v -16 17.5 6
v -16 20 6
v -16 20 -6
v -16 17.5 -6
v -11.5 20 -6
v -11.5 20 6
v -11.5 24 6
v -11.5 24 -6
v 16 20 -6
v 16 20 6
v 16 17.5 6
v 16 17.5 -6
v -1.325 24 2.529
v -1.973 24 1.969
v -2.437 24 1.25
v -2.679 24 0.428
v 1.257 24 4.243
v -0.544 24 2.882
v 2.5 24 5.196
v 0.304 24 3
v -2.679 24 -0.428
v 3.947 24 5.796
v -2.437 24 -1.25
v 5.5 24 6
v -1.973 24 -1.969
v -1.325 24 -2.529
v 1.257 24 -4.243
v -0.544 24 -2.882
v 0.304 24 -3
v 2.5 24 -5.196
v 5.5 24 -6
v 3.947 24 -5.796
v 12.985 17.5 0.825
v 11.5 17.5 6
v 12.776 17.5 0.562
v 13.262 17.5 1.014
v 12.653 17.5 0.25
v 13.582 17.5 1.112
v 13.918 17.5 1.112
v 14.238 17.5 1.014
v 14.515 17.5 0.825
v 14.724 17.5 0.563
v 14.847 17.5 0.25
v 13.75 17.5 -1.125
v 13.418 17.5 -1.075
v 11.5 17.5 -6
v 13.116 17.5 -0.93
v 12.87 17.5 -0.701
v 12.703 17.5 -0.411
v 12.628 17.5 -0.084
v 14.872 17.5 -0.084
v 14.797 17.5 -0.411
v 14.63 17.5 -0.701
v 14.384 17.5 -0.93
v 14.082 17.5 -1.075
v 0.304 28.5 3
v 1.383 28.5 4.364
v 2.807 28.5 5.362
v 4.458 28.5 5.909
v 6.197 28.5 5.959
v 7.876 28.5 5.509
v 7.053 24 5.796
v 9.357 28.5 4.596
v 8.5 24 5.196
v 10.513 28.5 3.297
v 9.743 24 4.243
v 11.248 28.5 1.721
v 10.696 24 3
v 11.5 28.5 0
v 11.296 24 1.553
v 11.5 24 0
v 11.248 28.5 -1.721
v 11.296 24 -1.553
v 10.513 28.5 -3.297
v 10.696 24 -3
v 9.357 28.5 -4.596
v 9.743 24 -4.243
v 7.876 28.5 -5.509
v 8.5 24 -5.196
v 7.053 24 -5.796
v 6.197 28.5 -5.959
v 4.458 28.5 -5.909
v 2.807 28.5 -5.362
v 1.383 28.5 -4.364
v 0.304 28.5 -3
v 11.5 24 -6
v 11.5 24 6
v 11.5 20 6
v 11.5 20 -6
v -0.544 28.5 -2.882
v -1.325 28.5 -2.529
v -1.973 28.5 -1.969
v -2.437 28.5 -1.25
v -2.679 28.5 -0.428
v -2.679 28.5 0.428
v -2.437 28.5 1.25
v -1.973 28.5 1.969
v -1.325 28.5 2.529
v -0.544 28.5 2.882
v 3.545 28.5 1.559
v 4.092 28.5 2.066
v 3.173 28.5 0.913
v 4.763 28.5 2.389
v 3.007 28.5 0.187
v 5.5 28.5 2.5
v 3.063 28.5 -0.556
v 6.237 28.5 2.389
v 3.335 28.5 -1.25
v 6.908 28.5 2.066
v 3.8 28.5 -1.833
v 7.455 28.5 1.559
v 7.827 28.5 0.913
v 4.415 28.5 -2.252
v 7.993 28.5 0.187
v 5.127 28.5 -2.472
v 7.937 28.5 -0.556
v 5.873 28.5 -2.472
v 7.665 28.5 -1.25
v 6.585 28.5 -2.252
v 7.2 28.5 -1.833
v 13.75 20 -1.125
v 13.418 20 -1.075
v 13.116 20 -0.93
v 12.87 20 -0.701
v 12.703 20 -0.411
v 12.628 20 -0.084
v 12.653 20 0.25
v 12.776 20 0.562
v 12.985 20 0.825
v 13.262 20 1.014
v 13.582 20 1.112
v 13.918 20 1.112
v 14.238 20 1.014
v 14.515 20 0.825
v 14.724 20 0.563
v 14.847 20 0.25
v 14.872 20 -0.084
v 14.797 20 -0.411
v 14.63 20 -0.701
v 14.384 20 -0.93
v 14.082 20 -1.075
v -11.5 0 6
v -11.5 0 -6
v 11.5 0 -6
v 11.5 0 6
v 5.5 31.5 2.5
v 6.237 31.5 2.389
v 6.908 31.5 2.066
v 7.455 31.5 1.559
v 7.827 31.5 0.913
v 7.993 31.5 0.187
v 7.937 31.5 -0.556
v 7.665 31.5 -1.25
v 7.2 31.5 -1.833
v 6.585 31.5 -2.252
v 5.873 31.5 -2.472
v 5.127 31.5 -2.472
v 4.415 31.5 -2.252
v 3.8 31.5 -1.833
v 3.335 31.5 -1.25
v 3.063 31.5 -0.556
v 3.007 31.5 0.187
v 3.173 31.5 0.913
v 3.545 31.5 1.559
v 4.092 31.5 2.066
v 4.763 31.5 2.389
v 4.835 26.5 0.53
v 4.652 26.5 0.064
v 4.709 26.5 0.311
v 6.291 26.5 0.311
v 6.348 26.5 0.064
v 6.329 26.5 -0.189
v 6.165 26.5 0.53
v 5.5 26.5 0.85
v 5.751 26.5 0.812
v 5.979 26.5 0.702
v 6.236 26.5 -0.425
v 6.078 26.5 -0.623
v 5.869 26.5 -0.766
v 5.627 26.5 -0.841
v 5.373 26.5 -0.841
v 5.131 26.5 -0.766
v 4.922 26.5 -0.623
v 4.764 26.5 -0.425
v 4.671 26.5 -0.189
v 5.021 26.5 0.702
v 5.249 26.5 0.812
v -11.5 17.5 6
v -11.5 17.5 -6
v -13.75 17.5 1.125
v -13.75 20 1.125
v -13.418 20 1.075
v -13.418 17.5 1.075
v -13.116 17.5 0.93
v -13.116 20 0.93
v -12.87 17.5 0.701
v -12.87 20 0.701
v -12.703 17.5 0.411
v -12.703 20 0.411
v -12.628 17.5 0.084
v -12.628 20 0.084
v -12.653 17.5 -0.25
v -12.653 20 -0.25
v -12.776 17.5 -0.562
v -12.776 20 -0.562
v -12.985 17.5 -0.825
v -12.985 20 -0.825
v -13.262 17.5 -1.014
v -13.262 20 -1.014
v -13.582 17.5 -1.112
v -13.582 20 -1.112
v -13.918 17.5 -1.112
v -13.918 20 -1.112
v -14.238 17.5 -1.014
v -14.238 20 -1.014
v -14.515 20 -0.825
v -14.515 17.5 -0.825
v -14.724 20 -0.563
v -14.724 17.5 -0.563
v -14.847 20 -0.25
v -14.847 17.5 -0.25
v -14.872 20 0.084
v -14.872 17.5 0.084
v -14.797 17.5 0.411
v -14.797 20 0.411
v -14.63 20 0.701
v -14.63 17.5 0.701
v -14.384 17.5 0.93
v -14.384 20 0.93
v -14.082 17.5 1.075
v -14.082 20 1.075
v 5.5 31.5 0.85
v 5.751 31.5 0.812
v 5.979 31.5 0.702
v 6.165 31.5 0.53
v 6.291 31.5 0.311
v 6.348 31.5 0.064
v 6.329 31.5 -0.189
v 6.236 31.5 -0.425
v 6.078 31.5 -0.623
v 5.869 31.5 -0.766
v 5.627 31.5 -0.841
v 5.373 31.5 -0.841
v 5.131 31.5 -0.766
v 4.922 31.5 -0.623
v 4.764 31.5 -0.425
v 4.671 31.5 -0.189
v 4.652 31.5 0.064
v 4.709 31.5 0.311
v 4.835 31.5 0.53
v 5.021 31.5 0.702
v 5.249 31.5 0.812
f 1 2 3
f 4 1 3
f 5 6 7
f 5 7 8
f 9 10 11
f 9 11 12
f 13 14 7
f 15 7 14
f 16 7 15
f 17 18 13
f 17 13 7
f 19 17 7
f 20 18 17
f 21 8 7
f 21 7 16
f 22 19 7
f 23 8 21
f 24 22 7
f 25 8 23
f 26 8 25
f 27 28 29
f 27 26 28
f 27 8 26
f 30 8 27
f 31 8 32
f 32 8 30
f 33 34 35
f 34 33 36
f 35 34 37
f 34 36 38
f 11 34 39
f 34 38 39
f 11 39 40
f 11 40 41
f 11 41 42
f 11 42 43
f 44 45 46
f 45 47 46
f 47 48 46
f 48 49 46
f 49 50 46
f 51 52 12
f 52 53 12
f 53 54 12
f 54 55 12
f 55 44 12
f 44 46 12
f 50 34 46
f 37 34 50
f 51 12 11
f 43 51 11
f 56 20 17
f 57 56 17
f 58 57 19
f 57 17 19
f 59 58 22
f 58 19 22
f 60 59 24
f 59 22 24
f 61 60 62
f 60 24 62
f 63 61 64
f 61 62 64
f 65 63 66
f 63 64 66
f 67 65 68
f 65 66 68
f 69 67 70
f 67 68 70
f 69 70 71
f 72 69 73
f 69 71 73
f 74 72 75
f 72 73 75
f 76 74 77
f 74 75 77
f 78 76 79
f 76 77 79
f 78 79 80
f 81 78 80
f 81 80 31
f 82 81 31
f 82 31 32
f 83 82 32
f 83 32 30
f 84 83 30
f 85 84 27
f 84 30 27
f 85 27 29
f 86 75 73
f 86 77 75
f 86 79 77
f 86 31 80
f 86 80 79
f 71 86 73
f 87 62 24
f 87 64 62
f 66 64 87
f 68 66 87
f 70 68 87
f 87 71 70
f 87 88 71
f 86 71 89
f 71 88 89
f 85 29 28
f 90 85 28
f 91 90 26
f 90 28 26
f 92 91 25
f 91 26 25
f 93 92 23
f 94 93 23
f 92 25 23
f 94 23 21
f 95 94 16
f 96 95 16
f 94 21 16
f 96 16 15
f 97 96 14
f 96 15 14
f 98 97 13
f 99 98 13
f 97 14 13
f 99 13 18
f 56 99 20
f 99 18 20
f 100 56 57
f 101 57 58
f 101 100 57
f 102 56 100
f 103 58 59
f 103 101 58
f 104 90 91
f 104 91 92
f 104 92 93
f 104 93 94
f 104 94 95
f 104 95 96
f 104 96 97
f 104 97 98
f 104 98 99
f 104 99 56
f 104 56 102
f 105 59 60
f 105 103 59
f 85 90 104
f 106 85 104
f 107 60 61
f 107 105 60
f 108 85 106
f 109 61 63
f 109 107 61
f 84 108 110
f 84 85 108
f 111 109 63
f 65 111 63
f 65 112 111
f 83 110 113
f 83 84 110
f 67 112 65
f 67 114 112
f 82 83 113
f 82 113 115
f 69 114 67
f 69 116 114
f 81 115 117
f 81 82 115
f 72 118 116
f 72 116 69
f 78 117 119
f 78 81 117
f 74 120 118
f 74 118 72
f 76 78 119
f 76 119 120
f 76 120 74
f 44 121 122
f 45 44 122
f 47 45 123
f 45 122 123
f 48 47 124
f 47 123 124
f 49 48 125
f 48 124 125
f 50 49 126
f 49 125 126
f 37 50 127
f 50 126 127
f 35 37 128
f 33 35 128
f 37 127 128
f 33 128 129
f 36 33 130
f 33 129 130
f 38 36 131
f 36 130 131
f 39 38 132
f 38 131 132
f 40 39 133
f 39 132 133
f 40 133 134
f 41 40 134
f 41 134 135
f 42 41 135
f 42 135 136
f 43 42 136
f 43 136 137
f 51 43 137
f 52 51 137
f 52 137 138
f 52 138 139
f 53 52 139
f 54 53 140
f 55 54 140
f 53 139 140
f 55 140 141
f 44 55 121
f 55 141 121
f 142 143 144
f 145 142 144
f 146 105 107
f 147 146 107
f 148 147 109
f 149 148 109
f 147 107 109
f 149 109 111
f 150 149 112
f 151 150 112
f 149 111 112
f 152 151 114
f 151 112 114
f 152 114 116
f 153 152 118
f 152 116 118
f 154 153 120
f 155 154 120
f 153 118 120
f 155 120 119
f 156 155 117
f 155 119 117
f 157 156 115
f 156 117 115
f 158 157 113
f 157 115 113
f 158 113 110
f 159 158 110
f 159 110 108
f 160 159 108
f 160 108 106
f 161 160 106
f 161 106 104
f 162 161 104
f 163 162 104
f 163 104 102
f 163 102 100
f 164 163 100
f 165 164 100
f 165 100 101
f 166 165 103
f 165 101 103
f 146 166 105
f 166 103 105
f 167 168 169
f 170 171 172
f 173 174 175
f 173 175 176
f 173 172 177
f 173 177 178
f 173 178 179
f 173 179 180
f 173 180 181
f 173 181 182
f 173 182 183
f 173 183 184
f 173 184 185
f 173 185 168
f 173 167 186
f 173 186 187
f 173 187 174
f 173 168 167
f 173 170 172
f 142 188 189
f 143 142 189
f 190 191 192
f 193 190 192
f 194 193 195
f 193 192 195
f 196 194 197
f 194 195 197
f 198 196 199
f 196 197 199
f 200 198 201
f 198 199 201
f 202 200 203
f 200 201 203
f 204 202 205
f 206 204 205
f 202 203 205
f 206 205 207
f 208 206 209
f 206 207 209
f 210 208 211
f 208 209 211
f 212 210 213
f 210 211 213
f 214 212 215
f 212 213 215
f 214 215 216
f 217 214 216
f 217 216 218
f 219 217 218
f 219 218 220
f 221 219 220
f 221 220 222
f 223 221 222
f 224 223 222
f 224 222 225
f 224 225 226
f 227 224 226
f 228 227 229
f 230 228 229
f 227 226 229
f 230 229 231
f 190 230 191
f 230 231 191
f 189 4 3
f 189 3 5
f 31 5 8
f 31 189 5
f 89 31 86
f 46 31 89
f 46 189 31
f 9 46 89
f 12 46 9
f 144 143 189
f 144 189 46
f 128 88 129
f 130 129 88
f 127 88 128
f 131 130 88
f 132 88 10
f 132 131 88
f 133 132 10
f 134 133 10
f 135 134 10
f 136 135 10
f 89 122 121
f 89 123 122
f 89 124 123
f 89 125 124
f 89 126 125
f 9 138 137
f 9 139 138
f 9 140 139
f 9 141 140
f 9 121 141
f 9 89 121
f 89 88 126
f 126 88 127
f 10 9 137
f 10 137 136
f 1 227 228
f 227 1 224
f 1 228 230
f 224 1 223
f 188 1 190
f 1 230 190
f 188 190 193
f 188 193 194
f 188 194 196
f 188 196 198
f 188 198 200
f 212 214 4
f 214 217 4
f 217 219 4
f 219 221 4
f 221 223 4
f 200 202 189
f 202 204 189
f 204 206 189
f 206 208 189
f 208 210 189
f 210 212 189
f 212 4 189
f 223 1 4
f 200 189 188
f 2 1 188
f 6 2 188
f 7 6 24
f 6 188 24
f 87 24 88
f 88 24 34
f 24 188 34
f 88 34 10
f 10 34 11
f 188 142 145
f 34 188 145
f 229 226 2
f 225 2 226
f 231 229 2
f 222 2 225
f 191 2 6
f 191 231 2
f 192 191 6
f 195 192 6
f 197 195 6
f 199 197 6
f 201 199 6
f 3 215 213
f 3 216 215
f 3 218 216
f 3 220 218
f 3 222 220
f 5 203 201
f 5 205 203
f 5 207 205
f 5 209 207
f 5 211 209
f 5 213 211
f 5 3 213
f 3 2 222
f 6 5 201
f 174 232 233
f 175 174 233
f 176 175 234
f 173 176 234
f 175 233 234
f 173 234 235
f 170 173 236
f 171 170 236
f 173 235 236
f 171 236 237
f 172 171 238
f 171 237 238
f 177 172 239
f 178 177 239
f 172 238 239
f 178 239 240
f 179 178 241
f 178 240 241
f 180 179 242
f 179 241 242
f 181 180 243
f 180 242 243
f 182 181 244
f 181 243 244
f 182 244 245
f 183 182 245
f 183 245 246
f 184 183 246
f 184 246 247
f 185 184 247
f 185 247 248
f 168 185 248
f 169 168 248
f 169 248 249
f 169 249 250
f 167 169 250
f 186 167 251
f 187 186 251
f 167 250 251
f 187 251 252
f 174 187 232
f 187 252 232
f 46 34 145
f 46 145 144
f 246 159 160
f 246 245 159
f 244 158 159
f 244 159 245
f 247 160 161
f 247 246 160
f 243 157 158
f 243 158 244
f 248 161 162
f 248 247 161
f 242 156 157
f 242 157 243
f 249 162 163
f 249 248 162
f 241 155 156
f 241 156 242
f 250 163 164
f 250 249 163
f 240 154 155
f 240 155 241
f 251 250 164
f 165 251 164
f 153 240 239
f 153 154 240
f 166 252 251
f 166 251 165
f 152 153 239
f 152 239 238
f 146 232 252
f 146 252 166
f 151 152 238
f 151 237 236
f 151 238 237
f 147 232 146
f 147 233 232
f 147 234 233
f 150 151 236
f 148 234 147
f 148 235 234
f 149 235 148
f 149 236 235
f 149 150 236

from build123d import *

# Parameters (mm, degrees)
SKETCH1_W           = 23
SKETCH1_H           = 12
BOSS_EXTRUDE1_DEPTH = 24
BOSS_EXTRUDE2_DEPTH = 4.5
SKETCH3_R           = 2.5
BOSS_EXTRUDE3_DEPTH = 3
SKETCH4_R           = 0.85
CUT_EXTRUDE1_DEPTH  = 5
BOSS_EXTRUDE4_START = -4
SKETCH5_W           = 4.5
SKETCH5_H           = 12
SKETCH5_R           = 1.125
BOSS_EXTRUDE4_DEPTH = 2.5


with BuildPart() as part:
    # Sketch1 → Boss-Extrude1 (new body)
    with BuildSketch(Plane(origin=(0, 0, 0), x_dir=(1, 0, 0), z_dir=(0, 1, 0))):
        Rectangle(SKETCH1_W, SKETCH1_H)
    extrude(amount=BOSS_EXTRUDE1_DEPTH)

    # Sketch2 → Boss-Extrude2 (add)
    with BuildSketch(Plane(origin=(0, 24, 0), x_dir=(1, 0, 0), z_dir=(0, 1, 0))):
        with BuildLine():
            ThreePointArc((0.303829175, 2.999968125), (-2.71, 0), (0.303829175, -2.999968125))
            ThreePointArc((0.303829175, -2.999968125), (11.5, 0), (0.303829175, 2.999968125))
        make_face()
    extrude(amount=BOSS_EXTRUDE2_DEPTH)

    # Sketch3 → Boss-Extrude3 (add)
    with BuildSketch(Plane(origin=(0, 28.5, 0), x_dir=(1, 0, 0), z_dir=(0, 1, 0))):
        with Locations(Location((5.5, 0, 0), (0, 0, 270))):
            Circle(SKETCH3_R)
    extrude(amount=BOSS_EXTRUDE3_DEPTH)

    # Sketch4 → Cut-Extrude1 (cut)
    with BuildSketch(Plane(origin=(0, 31.5, 0), x_dir=(1, 0, 0), z_dir=(0, 1, 0))):
        with Locations(Location((5.5, 0, 0), (0, 0, 270))):
            Circle(SKETCH4_R)
    extrude(amount=-CUT_EXTRUDE1_DEPTH, mode=Mode.SUBTRACT)

    # Sketch5 → Boss-Extrude4 (add)
    # profile 1 of 2: a face of its own
    with BuildSketch(Plane(origin=(0, 24, 0), x_dir=(1, 0, 0), z_dir=(0, 1, 0)).offset(BOSS_EXTRUDE4_START)):
        with Locations((-13.75, 0)):
            Rectangle(SKETCH5_W, SKETCH5_H)
        with Locations(Location((-13.75, 0, 0), (0, 0, 270))):
            Circle(SKETCH5_R, mode=Mode.SUBTRACT)
    # profile 2 of 2: a face of its own
    with BuildSketch(Plane(origin=(0, 24, 0), x_dir=(1, 0, 0), z_dir=(0, 1, 0)).offset(BOSS_EXTRUDE4_START)):
        with Locations((13.75, 0)):
            Rectangle(SKETCH5_W, SKETCH5_H)
        with Locations(Location((13.75, 0, 0), (0, 0, 90))):
            Circle(SKETCH5_R, mode=Mode.SUBTRACT)
    extrude(amount=-BOSS_EXTRUDE4_DEPTH)


solid = part.part
